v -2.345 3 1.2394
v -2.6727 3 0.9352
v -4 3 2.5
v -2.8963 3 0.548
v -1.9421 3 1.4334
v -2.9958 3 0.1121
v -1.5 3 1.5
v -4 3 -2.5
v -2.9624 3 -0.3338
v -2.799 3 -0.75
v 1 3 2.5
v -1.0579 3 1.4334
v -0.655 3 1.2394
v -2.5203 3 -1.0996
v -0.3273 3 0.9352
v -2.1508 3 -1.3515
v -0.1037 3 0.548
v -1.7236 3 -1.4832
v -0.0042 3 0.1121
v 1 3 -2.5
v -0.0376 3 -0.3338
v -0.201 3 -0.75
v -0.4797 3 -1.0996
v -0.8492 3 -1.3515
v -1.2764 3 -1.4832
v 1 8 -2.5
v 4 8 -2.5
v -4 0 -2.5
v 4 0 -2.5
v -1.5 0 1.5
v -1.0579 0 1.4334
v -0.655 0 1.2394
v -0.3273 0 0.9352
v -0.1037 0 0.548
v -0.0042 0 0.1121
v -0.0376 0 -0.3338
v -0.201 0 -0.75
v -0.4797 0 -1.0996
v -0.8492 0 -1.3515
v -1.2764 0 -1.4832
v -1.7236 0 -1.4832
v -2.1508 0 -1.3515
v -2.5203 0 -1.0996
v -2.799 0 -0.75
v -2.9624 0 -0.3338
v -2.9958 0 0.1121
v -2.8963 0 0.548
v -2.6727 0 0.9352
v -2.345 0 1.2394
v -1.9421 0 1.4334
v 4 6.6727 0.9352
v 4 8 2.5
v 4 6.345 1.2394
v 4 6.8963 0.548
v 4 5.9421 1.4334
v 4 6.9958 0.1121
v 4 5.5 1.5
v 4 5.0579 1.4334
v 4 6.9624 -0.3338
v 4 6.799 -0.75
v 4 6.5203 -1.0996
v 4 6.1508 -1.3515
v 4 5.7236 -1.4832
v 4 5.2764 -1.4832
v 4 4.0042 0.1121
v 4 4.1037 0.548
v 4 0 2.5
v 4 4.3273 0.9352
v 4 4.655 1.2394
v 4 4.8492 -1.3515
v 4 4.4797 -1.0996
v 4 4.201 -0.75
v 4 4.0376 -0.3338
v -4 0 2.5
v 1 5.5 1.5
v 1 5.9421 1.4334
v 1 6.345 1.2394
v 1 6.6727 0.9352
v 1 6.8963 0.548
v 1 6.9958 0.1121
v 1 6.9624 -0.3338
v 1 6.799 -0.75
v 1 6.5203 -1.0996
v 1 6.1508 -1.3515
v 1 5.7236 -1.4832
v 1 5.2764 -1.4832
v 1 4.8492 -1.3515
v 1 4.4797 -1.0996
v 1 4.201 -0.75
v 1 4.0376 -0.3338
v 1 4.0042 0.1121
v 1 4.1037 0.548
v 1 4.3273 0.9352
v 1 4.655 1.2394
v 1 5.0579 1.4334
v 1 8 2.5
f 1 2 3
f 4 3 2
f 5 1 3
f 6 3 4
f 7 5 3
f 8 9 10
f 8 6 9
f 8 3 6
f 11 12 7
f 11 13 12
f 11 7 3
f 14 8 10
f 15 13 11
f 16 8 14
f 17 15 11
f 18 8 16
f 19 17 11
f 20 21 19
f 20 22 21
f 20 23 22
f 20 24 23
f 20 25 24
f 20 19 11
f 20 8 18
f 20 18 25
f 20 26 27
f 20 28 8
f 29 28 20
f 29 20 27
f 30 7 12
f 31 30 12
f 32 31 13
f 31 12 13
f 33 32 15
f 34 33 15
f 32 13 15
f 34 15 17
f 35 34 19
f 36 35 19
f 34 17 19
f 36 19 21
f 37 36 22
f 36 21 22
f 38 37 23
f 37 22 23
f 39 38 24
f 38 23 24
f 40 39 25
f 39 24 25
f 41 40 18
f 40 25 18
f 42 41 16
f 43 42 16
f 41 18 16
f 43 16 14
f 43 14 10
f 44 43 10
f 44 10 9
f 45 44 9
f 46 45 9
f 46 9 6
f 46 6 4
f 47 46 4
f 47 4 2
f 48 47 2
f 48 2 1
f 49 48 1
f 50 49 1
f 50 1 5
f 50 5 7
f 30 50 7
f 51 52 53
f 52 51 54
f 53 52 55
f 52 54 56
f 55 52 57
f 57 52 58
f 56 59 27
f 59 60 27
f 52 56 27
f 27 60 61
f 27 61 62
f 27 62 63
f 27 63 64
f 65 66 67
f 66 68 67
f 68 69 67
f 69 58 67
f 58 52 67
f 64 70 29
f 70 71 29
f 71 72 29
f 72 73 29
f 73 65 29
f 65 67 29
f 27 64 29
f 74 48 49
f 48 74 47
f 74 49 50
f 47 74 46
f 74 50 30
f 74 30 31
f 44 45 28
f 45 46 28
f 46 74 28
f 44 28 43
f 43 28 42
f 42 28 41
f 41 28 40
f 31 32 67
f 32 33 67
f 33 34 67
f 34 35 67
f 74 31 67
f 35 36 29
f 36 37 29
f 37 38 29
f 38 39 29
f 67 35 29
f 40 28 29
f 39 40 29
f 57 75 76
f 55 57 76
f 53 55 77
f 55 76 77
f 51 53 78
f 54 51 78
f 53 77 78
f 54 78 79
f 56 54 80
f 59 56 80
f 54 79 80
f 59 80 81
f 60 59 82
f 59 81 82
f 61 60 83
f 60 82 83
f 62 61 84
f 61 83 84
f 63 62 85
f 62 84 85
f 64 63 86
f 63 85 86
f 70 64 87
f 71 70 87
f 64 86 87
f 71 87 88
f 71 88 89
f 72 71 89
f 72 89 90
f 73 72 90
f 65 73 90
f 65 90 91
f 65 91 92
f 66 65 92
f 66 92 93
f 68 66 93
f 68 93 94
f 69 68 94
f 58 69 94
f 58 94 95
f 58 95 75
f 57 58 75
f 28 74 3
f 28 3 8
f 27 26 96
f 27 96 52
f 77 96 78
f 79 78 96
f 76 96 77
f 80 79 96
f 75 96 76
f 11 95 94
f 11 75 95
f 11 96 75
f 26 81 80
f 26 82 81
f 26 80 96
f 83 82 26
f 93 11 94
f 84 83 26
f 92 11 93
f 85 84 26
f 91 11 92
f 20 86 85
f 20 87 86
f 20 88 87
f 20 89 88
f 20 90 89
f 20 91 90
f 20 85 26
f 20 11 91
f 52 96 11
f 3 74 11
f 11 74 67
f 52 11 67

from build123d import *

# Parameters (mm, degrees)
SKETCH1_W           = 8
SKETCH1_H           = 5
BOSS_EXTRUDE1_DEPTH = 3
SKETCH2_W           = 3
SKETCH2_H           = 5
BOSS_EXTRUDE2_DEPTH = 5
SKETCH3_R           = 1.5
CUT_EXTRUDE1_DEPTH  = 5
SKETCH4_R           = 1.5
CUT_EXTRUDE2_DEPTH  = 5


with BuildPart() as part:
    # Sketch1 → Boss-Extrude1 (new body)
    with BuildSketch(Plane(origin=(0, 0, 0), x_dir=(1, 0, 0), z_dir=(0, 1, 0))):
        Rectangle(SKETCH1_W, SKETCH1_H)
    extrude(amount=BOSS_EXTRUDE1_DEPTH)

    # Sketch2 → Boss-Extrude2 (add)
    with BuildSketch(Plane(origin=(0, 3, 0), x_dir=(1, 0, 0), z_dir=(0, 1, 0))):
        with Locations((2.5, 0)):
            Rectangle(SKETCH2_W, SKETCH2_H)
    extrude(amount=BOSS_EXTRUDE2_DEPTH)

    # Sketch3 → Cut-Extrude1 (cut)
    with BuildSketch(Plane(origin=(0, 3, 0), x_dir=(1, 0, 0), z_dir=(0, 1, 0))):
        with Locations(Location((-1.5, 0, 0), (0, 0, 270))):
            Circle(SKETCH3_R)
    extrude(amount=-CUT_EXTRUDE1_DEPTH, mode=Mode.SUBTRACT)

    # Sketch4 → Cut-Extrude2 (cut)
    with BuildSketch(Plane.ZY.offset(-1)):
        with Locations((0, 5.5)):
            Circle(SKETCH4_R)
    extrude(amount=-CUT_EXTRUDE2_DEPTH, mode=Mode.SUBTRACT)


solid = part.part
